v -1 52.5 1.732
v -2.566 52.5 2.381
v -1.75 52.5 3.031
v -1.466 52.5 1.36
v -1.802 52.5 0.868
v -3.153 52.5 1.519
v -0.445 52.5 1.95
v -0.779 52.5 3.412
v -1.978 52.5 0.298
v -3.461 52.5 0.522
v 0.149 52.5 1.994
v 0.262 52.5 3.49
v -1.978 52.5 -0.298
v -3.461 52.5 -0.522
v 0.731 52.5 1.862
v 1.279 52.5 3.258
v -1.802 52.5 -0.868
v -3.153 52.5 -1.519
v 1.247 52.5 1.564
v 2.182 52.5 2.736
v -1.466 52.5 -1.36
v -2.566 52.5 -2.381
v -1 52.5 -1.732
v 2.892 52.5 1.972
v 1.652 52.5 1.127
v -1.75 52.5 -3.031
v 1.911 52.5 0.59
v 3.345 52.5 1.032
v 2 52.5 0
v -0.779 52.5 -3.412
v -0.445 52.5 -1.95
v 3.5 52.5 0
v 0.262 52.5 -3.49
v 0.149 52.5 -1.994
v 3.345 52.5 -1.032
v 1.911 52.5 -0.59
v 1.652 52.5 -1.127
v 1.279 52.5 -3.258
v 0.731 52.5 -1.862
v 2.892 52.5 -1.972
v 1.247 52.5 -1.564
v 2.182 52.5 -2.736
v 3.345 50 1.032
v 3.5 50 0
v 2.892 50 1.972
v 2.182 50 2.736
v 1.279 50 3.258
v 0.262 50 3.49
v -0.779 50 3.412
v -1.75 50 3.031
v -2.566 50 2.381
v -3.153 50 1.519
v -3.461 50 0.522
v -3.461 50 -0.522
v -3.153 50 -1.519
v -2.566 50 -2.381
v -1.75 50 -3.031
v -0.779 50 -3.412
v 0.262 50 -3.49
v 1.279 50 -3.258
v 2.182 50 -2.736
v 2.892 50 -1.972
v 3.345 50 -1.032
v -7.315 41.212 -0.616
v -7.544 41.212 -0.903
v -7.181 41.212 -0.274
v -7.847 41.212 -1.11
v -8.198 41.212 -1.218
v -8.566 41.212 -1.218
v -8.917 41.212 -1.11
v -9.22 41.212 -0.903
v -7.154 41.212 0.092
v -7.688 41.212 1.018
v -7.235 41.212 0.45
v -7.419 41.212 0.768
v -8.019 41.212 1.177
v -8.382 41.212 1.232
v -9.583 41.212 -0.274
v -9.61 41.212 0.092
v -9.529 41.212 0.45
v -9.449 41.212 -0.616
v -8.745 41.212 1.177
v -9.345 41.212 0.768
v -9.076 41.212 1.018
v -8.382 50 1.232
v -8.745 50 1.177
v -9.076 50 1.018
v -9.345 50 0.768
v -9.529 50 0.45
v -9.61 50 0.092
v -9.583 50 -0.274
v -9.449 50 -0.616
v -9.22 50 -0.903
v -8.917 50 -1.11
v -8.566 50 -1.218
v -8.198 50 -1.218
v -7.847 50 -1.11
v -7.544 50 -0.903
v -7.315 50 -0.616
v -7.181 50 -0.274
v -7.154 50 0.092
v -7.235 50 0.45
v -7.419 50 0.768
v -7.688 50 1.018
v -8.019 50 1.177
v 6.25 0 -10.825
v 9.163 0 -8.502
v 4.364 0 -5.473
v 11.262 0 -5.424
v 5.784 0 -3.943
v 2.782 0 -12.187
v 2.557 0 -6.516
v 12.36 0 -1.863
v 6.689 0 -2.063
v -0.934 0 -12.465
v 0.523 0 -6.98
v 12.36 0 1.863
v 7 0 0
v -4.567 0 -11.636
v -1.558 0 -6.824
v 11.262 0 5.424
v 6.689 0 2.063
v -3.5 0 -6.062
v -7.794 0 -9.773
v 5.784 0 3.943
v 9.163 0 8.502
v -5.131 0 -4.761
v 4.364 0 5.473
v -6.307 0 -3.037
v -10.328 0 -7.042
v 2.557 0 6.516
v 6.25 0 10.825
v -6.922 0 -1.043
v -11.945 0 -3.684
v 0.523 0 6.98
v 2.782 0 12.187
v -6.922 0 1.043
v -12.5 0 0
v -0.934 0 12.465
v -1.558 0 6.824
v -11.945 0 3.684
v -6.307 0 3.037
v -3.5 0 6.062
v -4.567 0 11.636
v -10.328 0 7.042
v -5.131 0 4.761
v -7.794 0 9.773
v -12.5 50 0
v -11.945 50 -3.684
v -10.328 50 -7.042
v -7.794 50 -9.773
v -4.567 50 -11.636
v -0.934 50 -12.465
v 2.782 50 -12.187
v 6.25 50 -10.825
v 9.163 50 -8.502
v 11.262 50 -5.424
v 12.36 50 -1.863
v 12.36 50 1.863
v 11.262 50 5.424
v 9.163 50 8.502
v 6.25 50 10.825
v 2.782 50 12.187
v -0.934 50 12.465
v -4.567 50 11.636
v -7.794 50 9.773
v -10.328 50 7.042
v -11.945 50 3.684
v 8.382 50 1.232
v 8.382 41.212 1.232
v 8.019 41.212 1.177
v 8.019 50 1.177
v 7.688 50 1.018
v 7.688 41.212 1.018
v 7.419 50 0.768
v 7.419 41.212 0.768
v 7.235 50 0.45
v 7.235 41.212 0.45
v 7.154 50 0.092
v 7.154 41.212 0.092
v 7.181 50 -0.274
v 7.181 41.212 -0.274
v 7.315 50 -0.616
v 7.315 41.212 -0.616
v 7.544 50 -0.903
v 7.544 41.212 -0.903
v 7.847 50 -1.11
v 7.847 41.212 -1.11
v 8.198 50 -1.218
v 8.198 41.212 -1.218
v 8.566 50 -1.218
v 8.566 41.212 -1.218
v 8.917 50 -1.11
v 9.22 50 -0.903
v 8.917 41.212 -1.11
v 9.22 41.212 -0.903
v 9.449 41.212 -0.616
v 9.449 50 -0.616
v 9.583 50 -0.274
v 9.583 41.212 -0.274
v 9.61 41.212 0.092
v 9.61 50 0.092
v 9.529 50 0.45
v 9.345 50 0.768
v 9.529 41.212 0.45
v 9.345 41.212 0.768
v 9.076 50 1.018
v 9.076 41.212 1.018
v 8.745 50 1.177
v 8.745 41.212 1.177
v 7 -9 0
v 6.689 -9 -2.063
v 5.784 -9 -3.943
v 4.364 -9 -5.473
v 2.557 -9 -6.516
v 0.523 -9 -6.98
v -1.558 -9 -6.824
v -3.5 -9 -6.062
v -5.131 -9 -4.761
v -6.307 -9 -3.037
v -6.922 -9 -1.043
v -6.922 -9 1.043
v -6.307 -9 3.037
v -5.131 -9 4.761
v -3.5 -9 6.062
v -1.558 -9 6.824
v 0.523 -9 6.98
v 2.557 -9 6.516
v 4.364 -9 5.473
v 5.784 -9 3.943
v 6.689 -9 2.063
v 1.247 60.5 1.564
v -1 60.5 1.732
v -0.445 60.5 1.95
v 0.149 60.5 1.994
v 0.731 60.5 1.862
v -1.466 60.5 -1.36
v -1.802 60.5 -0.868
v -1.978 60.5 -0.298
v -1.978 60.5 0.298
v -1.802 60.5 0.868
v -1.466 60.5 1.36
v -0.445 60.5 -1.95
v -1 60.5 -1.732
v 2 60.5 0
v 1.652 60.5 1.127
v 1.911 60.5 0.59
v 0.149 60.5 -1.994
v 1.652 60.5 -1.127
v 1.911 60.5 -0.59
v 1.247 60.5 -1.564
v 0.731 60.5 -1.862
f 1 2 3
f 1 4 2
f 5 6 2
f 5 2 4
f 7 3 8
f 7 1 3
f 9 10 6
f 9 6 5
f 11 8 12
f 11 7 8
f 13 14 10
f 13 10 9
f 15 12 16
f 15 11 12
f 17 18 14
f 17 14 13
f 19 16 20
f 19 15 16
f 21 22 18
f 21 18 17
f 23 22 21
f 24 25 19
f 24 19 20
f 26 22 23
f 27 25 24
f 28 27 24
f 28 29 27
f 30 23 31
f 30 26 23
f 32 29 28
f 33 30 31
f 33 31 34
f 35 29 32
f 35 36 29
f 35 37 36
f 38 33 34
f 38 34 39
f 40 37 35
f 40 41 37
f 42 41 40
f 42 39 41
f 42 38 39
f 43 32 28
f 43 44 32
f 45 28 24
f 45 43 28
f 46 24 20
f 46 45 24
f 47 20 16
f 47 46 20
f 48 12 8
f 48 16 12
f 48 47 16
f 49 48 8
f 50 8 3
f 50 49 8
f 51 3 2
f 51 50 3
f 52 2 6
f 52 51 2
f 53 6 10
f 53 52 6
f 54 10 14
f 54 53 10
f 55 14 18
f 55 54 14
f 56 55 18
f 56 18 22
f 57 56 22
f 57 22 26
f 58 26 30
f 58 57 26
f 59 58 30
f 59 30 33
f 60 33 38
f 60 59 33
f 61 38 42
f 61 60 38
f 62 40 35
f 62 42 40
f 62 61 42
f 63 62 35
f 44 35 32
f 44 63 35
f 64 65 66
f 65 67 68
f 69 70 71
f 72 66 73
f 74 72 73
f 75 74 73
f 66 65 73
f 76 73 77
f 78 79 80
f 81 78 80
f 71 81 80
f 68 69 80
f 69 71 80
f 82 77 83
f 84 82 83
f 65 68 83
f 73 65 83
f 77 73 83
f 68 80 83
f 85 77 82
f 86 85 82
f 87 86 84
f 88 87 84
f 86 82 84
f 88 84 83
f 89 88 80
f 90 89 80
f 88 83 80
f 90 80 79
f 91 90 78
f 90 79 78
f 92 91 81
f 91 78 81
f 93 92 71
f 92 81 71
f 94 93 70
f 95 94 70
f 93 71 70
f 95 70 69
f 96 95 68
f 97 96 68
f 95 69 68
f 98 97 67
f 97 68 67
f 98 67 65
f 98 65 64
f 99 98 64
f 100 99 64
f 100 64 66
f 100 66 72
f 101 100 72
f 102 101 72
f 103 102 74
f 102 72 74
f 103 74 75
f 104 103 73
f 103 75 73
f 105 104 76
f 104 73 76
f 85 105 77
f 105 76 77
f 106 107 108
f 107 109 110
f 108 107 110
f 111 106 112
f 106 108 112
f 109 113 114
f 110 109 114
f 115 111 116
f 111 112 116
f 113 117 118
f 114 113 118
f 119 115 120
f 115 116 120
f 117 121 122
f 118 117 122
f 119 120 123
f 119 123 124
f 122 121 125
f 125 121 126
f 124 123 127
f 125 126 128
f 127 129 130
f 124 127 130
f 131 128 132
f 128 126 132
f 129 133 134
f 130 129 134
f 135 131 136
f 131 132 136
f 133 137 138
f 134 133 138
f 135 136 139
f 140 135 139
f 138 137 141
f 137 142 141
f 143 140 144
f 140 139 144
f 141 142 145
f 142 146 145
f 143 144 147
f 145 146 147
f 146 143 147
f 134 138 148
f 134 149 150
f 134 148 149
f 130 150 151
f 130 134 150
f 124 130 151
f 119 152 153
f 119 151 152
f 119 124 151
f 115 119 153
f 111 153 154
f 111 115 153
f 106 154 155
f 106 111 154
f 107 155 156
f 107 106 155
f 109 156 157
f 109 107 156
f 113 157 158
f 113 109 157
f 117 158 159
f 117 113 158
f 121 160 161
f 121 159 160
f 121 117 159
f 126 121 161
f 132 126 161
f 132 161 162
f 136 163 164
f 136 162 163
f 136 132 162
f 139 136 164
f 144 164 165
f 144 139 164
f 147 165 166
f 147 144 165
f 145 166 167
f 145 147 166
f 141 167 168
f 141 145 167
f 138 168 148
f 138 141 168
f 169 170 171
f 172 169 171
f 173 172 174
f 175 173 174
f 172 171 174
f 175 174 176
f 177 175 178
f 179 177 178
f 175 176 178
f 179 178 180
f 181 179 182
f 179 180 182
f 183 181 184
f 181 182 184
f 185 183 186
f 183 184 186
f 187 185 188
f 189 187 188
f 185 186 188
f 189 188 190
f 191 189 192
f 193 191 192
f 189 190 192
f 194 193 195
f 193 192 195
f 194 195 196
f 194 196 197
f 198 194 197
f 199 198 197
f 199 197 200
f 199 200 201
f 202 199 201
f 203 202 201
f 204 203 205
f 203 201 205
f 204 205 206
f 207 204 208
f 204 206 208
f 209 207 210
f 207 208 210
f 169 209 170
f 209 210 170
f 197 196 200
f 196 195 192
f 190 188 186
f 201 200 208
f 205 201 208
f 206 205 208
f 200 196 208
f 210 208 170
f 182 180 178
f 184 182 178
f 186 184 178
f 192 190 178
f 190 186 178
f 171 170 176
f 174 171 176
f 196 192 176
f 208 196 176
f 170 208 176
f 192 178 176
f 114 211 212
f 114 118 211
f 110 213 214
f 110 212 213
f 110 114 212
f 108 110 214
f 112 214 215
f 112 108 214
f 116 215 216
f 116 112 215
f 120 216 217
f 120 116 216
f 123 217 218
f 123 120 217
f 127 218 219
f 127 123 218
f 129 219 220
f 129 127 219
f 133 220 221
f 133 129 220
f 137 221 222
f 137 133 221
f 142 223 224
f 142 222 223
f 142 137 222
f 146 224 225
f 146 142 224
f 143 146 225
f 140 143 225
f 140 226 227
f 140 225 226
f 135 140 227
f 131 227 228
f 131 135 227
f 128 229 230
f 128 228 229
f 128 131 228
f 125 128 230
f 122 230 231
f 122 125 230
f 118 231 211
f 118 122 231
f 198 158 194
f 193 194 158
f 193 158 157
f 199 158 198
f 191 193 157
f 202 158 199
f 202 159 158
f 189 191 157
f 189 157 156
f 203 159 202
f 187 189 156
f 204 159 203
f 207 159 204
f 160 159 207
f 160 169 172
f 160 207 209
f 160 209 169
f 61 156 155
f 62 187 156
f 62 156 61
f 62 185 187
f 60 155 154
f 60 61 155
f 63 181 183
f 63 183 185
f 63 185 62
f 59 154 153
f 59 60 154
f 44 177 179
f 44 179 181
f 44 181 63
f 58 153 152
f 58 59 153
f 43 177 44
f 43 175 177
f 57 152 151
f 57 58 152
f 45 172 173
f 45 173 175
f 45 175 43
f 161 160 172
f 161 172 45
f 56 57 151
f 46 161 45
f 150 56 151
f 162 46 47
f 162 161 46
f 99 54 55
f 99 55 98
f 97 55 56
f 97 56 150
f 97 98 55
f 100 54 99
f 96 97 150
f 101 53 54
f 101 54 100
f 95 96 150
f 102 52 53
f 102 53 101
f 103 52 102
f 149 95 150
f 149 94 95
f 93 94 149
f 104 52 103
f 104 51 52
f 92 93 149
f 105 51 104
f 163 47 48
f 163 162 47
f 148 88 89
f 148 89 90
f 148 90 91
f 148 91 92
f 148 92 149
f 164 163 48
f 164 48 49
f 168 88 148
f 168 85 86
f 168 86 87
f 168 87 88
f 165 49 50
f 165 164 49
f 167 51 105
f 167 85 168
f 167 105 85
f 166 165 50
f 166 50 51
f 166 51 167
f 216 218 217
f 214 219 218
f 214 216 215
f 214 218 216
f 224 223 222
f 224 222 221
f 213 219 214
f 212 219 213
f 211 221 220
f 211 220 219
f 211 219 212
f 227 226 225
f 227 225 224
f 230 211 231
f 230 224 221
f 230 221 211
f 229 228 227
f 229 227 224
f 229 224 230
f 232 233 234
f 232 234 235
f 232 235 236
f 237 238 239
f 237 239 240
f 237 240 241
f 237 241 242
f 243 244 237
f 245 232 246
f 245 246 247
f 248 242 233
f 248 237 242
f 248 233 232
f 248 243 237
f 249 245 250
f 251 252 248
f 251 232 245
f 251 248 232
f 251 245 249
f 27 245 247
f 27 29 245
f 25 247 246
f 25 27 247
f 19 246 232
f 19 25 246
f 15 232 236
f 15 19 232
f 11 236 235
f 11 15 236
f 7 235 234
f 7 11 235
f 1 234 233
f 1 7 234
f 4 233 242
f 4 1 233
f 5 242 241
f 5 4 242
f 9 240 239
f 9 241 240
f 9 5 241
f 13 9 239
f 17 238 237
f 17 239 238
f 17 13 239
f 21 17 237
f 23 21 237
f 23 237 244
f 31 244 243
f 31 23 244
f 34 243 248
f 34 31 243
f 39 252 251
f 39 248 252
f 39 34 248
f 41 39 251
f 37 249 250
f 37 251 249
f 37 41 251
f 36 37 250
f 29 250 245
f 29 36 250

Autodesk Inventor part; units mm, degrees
ref_plane "YZ Plane" through (0, 0, 0) normal (1, 0, 0) x (0, 1, 0)
ref_plane "XZ Plane" through (0, 0, 0) normal (0, 1, 0) x (-1, 0, 0)
ref_plane "XY Plane" through (0, 0, 0) normal (0, 0, 1) x (1, 0, 0)
sketch "Sketch1" plane through (0, 0, 0) normal (0, 1, 0) x (-1, 0, 0)
  circle A0 centre (0, 0) radius 12.5
  dimension "d0" = 25
extrude "Extrusion1" add sketch "Sketch1" along normal blind 50
sketch "Sketch2" plane through (0, 50, 0) normal (0, 1, 0) x (1, 0, 0)
  circle A0 centre (0, 0) radius 3.5
  dimension "d3" = 7
extrude "Extrusion2" add sketch "Sketch2" along normal blind 2.5
sketch "Sketch3" plane through (0, 52.5, 0) normal (0, 1, 0) x (1, 0, 0)
  circle A0 centre (0, 0) radius 2
  dimension "d6" = 4
extrude "Extrusion3" add sketch "Sketch3" along normal blind 8
sketch "Sketch4" plane through (0, 0, 0) normal (0, -1, 0) x (1, 0, 0)
  circle A0 centre (0, 0) radius 7
  dimension "d9" = 14
extrude "Extrusion4" add sketch "Sketch4" along normal blind 9
sketch "Sketch5" plane through (0, 50, 0) normal (0, 1, 0) x (1, 0, 0)
  circle A0 centre (0, 0) radius 3.5 projected
  point P0 (-8.382, 0)
  point P1 (8.382, 0)
  dimension "d12" = 8.382
  dimension "d13" = 8.382
hole "Hole1" at (-8.382, 50, 0) at (8.382, 50, 0) direction (0, -1, 0) diameter 2.4638 depth 8.7884
properties part number "Motor"
